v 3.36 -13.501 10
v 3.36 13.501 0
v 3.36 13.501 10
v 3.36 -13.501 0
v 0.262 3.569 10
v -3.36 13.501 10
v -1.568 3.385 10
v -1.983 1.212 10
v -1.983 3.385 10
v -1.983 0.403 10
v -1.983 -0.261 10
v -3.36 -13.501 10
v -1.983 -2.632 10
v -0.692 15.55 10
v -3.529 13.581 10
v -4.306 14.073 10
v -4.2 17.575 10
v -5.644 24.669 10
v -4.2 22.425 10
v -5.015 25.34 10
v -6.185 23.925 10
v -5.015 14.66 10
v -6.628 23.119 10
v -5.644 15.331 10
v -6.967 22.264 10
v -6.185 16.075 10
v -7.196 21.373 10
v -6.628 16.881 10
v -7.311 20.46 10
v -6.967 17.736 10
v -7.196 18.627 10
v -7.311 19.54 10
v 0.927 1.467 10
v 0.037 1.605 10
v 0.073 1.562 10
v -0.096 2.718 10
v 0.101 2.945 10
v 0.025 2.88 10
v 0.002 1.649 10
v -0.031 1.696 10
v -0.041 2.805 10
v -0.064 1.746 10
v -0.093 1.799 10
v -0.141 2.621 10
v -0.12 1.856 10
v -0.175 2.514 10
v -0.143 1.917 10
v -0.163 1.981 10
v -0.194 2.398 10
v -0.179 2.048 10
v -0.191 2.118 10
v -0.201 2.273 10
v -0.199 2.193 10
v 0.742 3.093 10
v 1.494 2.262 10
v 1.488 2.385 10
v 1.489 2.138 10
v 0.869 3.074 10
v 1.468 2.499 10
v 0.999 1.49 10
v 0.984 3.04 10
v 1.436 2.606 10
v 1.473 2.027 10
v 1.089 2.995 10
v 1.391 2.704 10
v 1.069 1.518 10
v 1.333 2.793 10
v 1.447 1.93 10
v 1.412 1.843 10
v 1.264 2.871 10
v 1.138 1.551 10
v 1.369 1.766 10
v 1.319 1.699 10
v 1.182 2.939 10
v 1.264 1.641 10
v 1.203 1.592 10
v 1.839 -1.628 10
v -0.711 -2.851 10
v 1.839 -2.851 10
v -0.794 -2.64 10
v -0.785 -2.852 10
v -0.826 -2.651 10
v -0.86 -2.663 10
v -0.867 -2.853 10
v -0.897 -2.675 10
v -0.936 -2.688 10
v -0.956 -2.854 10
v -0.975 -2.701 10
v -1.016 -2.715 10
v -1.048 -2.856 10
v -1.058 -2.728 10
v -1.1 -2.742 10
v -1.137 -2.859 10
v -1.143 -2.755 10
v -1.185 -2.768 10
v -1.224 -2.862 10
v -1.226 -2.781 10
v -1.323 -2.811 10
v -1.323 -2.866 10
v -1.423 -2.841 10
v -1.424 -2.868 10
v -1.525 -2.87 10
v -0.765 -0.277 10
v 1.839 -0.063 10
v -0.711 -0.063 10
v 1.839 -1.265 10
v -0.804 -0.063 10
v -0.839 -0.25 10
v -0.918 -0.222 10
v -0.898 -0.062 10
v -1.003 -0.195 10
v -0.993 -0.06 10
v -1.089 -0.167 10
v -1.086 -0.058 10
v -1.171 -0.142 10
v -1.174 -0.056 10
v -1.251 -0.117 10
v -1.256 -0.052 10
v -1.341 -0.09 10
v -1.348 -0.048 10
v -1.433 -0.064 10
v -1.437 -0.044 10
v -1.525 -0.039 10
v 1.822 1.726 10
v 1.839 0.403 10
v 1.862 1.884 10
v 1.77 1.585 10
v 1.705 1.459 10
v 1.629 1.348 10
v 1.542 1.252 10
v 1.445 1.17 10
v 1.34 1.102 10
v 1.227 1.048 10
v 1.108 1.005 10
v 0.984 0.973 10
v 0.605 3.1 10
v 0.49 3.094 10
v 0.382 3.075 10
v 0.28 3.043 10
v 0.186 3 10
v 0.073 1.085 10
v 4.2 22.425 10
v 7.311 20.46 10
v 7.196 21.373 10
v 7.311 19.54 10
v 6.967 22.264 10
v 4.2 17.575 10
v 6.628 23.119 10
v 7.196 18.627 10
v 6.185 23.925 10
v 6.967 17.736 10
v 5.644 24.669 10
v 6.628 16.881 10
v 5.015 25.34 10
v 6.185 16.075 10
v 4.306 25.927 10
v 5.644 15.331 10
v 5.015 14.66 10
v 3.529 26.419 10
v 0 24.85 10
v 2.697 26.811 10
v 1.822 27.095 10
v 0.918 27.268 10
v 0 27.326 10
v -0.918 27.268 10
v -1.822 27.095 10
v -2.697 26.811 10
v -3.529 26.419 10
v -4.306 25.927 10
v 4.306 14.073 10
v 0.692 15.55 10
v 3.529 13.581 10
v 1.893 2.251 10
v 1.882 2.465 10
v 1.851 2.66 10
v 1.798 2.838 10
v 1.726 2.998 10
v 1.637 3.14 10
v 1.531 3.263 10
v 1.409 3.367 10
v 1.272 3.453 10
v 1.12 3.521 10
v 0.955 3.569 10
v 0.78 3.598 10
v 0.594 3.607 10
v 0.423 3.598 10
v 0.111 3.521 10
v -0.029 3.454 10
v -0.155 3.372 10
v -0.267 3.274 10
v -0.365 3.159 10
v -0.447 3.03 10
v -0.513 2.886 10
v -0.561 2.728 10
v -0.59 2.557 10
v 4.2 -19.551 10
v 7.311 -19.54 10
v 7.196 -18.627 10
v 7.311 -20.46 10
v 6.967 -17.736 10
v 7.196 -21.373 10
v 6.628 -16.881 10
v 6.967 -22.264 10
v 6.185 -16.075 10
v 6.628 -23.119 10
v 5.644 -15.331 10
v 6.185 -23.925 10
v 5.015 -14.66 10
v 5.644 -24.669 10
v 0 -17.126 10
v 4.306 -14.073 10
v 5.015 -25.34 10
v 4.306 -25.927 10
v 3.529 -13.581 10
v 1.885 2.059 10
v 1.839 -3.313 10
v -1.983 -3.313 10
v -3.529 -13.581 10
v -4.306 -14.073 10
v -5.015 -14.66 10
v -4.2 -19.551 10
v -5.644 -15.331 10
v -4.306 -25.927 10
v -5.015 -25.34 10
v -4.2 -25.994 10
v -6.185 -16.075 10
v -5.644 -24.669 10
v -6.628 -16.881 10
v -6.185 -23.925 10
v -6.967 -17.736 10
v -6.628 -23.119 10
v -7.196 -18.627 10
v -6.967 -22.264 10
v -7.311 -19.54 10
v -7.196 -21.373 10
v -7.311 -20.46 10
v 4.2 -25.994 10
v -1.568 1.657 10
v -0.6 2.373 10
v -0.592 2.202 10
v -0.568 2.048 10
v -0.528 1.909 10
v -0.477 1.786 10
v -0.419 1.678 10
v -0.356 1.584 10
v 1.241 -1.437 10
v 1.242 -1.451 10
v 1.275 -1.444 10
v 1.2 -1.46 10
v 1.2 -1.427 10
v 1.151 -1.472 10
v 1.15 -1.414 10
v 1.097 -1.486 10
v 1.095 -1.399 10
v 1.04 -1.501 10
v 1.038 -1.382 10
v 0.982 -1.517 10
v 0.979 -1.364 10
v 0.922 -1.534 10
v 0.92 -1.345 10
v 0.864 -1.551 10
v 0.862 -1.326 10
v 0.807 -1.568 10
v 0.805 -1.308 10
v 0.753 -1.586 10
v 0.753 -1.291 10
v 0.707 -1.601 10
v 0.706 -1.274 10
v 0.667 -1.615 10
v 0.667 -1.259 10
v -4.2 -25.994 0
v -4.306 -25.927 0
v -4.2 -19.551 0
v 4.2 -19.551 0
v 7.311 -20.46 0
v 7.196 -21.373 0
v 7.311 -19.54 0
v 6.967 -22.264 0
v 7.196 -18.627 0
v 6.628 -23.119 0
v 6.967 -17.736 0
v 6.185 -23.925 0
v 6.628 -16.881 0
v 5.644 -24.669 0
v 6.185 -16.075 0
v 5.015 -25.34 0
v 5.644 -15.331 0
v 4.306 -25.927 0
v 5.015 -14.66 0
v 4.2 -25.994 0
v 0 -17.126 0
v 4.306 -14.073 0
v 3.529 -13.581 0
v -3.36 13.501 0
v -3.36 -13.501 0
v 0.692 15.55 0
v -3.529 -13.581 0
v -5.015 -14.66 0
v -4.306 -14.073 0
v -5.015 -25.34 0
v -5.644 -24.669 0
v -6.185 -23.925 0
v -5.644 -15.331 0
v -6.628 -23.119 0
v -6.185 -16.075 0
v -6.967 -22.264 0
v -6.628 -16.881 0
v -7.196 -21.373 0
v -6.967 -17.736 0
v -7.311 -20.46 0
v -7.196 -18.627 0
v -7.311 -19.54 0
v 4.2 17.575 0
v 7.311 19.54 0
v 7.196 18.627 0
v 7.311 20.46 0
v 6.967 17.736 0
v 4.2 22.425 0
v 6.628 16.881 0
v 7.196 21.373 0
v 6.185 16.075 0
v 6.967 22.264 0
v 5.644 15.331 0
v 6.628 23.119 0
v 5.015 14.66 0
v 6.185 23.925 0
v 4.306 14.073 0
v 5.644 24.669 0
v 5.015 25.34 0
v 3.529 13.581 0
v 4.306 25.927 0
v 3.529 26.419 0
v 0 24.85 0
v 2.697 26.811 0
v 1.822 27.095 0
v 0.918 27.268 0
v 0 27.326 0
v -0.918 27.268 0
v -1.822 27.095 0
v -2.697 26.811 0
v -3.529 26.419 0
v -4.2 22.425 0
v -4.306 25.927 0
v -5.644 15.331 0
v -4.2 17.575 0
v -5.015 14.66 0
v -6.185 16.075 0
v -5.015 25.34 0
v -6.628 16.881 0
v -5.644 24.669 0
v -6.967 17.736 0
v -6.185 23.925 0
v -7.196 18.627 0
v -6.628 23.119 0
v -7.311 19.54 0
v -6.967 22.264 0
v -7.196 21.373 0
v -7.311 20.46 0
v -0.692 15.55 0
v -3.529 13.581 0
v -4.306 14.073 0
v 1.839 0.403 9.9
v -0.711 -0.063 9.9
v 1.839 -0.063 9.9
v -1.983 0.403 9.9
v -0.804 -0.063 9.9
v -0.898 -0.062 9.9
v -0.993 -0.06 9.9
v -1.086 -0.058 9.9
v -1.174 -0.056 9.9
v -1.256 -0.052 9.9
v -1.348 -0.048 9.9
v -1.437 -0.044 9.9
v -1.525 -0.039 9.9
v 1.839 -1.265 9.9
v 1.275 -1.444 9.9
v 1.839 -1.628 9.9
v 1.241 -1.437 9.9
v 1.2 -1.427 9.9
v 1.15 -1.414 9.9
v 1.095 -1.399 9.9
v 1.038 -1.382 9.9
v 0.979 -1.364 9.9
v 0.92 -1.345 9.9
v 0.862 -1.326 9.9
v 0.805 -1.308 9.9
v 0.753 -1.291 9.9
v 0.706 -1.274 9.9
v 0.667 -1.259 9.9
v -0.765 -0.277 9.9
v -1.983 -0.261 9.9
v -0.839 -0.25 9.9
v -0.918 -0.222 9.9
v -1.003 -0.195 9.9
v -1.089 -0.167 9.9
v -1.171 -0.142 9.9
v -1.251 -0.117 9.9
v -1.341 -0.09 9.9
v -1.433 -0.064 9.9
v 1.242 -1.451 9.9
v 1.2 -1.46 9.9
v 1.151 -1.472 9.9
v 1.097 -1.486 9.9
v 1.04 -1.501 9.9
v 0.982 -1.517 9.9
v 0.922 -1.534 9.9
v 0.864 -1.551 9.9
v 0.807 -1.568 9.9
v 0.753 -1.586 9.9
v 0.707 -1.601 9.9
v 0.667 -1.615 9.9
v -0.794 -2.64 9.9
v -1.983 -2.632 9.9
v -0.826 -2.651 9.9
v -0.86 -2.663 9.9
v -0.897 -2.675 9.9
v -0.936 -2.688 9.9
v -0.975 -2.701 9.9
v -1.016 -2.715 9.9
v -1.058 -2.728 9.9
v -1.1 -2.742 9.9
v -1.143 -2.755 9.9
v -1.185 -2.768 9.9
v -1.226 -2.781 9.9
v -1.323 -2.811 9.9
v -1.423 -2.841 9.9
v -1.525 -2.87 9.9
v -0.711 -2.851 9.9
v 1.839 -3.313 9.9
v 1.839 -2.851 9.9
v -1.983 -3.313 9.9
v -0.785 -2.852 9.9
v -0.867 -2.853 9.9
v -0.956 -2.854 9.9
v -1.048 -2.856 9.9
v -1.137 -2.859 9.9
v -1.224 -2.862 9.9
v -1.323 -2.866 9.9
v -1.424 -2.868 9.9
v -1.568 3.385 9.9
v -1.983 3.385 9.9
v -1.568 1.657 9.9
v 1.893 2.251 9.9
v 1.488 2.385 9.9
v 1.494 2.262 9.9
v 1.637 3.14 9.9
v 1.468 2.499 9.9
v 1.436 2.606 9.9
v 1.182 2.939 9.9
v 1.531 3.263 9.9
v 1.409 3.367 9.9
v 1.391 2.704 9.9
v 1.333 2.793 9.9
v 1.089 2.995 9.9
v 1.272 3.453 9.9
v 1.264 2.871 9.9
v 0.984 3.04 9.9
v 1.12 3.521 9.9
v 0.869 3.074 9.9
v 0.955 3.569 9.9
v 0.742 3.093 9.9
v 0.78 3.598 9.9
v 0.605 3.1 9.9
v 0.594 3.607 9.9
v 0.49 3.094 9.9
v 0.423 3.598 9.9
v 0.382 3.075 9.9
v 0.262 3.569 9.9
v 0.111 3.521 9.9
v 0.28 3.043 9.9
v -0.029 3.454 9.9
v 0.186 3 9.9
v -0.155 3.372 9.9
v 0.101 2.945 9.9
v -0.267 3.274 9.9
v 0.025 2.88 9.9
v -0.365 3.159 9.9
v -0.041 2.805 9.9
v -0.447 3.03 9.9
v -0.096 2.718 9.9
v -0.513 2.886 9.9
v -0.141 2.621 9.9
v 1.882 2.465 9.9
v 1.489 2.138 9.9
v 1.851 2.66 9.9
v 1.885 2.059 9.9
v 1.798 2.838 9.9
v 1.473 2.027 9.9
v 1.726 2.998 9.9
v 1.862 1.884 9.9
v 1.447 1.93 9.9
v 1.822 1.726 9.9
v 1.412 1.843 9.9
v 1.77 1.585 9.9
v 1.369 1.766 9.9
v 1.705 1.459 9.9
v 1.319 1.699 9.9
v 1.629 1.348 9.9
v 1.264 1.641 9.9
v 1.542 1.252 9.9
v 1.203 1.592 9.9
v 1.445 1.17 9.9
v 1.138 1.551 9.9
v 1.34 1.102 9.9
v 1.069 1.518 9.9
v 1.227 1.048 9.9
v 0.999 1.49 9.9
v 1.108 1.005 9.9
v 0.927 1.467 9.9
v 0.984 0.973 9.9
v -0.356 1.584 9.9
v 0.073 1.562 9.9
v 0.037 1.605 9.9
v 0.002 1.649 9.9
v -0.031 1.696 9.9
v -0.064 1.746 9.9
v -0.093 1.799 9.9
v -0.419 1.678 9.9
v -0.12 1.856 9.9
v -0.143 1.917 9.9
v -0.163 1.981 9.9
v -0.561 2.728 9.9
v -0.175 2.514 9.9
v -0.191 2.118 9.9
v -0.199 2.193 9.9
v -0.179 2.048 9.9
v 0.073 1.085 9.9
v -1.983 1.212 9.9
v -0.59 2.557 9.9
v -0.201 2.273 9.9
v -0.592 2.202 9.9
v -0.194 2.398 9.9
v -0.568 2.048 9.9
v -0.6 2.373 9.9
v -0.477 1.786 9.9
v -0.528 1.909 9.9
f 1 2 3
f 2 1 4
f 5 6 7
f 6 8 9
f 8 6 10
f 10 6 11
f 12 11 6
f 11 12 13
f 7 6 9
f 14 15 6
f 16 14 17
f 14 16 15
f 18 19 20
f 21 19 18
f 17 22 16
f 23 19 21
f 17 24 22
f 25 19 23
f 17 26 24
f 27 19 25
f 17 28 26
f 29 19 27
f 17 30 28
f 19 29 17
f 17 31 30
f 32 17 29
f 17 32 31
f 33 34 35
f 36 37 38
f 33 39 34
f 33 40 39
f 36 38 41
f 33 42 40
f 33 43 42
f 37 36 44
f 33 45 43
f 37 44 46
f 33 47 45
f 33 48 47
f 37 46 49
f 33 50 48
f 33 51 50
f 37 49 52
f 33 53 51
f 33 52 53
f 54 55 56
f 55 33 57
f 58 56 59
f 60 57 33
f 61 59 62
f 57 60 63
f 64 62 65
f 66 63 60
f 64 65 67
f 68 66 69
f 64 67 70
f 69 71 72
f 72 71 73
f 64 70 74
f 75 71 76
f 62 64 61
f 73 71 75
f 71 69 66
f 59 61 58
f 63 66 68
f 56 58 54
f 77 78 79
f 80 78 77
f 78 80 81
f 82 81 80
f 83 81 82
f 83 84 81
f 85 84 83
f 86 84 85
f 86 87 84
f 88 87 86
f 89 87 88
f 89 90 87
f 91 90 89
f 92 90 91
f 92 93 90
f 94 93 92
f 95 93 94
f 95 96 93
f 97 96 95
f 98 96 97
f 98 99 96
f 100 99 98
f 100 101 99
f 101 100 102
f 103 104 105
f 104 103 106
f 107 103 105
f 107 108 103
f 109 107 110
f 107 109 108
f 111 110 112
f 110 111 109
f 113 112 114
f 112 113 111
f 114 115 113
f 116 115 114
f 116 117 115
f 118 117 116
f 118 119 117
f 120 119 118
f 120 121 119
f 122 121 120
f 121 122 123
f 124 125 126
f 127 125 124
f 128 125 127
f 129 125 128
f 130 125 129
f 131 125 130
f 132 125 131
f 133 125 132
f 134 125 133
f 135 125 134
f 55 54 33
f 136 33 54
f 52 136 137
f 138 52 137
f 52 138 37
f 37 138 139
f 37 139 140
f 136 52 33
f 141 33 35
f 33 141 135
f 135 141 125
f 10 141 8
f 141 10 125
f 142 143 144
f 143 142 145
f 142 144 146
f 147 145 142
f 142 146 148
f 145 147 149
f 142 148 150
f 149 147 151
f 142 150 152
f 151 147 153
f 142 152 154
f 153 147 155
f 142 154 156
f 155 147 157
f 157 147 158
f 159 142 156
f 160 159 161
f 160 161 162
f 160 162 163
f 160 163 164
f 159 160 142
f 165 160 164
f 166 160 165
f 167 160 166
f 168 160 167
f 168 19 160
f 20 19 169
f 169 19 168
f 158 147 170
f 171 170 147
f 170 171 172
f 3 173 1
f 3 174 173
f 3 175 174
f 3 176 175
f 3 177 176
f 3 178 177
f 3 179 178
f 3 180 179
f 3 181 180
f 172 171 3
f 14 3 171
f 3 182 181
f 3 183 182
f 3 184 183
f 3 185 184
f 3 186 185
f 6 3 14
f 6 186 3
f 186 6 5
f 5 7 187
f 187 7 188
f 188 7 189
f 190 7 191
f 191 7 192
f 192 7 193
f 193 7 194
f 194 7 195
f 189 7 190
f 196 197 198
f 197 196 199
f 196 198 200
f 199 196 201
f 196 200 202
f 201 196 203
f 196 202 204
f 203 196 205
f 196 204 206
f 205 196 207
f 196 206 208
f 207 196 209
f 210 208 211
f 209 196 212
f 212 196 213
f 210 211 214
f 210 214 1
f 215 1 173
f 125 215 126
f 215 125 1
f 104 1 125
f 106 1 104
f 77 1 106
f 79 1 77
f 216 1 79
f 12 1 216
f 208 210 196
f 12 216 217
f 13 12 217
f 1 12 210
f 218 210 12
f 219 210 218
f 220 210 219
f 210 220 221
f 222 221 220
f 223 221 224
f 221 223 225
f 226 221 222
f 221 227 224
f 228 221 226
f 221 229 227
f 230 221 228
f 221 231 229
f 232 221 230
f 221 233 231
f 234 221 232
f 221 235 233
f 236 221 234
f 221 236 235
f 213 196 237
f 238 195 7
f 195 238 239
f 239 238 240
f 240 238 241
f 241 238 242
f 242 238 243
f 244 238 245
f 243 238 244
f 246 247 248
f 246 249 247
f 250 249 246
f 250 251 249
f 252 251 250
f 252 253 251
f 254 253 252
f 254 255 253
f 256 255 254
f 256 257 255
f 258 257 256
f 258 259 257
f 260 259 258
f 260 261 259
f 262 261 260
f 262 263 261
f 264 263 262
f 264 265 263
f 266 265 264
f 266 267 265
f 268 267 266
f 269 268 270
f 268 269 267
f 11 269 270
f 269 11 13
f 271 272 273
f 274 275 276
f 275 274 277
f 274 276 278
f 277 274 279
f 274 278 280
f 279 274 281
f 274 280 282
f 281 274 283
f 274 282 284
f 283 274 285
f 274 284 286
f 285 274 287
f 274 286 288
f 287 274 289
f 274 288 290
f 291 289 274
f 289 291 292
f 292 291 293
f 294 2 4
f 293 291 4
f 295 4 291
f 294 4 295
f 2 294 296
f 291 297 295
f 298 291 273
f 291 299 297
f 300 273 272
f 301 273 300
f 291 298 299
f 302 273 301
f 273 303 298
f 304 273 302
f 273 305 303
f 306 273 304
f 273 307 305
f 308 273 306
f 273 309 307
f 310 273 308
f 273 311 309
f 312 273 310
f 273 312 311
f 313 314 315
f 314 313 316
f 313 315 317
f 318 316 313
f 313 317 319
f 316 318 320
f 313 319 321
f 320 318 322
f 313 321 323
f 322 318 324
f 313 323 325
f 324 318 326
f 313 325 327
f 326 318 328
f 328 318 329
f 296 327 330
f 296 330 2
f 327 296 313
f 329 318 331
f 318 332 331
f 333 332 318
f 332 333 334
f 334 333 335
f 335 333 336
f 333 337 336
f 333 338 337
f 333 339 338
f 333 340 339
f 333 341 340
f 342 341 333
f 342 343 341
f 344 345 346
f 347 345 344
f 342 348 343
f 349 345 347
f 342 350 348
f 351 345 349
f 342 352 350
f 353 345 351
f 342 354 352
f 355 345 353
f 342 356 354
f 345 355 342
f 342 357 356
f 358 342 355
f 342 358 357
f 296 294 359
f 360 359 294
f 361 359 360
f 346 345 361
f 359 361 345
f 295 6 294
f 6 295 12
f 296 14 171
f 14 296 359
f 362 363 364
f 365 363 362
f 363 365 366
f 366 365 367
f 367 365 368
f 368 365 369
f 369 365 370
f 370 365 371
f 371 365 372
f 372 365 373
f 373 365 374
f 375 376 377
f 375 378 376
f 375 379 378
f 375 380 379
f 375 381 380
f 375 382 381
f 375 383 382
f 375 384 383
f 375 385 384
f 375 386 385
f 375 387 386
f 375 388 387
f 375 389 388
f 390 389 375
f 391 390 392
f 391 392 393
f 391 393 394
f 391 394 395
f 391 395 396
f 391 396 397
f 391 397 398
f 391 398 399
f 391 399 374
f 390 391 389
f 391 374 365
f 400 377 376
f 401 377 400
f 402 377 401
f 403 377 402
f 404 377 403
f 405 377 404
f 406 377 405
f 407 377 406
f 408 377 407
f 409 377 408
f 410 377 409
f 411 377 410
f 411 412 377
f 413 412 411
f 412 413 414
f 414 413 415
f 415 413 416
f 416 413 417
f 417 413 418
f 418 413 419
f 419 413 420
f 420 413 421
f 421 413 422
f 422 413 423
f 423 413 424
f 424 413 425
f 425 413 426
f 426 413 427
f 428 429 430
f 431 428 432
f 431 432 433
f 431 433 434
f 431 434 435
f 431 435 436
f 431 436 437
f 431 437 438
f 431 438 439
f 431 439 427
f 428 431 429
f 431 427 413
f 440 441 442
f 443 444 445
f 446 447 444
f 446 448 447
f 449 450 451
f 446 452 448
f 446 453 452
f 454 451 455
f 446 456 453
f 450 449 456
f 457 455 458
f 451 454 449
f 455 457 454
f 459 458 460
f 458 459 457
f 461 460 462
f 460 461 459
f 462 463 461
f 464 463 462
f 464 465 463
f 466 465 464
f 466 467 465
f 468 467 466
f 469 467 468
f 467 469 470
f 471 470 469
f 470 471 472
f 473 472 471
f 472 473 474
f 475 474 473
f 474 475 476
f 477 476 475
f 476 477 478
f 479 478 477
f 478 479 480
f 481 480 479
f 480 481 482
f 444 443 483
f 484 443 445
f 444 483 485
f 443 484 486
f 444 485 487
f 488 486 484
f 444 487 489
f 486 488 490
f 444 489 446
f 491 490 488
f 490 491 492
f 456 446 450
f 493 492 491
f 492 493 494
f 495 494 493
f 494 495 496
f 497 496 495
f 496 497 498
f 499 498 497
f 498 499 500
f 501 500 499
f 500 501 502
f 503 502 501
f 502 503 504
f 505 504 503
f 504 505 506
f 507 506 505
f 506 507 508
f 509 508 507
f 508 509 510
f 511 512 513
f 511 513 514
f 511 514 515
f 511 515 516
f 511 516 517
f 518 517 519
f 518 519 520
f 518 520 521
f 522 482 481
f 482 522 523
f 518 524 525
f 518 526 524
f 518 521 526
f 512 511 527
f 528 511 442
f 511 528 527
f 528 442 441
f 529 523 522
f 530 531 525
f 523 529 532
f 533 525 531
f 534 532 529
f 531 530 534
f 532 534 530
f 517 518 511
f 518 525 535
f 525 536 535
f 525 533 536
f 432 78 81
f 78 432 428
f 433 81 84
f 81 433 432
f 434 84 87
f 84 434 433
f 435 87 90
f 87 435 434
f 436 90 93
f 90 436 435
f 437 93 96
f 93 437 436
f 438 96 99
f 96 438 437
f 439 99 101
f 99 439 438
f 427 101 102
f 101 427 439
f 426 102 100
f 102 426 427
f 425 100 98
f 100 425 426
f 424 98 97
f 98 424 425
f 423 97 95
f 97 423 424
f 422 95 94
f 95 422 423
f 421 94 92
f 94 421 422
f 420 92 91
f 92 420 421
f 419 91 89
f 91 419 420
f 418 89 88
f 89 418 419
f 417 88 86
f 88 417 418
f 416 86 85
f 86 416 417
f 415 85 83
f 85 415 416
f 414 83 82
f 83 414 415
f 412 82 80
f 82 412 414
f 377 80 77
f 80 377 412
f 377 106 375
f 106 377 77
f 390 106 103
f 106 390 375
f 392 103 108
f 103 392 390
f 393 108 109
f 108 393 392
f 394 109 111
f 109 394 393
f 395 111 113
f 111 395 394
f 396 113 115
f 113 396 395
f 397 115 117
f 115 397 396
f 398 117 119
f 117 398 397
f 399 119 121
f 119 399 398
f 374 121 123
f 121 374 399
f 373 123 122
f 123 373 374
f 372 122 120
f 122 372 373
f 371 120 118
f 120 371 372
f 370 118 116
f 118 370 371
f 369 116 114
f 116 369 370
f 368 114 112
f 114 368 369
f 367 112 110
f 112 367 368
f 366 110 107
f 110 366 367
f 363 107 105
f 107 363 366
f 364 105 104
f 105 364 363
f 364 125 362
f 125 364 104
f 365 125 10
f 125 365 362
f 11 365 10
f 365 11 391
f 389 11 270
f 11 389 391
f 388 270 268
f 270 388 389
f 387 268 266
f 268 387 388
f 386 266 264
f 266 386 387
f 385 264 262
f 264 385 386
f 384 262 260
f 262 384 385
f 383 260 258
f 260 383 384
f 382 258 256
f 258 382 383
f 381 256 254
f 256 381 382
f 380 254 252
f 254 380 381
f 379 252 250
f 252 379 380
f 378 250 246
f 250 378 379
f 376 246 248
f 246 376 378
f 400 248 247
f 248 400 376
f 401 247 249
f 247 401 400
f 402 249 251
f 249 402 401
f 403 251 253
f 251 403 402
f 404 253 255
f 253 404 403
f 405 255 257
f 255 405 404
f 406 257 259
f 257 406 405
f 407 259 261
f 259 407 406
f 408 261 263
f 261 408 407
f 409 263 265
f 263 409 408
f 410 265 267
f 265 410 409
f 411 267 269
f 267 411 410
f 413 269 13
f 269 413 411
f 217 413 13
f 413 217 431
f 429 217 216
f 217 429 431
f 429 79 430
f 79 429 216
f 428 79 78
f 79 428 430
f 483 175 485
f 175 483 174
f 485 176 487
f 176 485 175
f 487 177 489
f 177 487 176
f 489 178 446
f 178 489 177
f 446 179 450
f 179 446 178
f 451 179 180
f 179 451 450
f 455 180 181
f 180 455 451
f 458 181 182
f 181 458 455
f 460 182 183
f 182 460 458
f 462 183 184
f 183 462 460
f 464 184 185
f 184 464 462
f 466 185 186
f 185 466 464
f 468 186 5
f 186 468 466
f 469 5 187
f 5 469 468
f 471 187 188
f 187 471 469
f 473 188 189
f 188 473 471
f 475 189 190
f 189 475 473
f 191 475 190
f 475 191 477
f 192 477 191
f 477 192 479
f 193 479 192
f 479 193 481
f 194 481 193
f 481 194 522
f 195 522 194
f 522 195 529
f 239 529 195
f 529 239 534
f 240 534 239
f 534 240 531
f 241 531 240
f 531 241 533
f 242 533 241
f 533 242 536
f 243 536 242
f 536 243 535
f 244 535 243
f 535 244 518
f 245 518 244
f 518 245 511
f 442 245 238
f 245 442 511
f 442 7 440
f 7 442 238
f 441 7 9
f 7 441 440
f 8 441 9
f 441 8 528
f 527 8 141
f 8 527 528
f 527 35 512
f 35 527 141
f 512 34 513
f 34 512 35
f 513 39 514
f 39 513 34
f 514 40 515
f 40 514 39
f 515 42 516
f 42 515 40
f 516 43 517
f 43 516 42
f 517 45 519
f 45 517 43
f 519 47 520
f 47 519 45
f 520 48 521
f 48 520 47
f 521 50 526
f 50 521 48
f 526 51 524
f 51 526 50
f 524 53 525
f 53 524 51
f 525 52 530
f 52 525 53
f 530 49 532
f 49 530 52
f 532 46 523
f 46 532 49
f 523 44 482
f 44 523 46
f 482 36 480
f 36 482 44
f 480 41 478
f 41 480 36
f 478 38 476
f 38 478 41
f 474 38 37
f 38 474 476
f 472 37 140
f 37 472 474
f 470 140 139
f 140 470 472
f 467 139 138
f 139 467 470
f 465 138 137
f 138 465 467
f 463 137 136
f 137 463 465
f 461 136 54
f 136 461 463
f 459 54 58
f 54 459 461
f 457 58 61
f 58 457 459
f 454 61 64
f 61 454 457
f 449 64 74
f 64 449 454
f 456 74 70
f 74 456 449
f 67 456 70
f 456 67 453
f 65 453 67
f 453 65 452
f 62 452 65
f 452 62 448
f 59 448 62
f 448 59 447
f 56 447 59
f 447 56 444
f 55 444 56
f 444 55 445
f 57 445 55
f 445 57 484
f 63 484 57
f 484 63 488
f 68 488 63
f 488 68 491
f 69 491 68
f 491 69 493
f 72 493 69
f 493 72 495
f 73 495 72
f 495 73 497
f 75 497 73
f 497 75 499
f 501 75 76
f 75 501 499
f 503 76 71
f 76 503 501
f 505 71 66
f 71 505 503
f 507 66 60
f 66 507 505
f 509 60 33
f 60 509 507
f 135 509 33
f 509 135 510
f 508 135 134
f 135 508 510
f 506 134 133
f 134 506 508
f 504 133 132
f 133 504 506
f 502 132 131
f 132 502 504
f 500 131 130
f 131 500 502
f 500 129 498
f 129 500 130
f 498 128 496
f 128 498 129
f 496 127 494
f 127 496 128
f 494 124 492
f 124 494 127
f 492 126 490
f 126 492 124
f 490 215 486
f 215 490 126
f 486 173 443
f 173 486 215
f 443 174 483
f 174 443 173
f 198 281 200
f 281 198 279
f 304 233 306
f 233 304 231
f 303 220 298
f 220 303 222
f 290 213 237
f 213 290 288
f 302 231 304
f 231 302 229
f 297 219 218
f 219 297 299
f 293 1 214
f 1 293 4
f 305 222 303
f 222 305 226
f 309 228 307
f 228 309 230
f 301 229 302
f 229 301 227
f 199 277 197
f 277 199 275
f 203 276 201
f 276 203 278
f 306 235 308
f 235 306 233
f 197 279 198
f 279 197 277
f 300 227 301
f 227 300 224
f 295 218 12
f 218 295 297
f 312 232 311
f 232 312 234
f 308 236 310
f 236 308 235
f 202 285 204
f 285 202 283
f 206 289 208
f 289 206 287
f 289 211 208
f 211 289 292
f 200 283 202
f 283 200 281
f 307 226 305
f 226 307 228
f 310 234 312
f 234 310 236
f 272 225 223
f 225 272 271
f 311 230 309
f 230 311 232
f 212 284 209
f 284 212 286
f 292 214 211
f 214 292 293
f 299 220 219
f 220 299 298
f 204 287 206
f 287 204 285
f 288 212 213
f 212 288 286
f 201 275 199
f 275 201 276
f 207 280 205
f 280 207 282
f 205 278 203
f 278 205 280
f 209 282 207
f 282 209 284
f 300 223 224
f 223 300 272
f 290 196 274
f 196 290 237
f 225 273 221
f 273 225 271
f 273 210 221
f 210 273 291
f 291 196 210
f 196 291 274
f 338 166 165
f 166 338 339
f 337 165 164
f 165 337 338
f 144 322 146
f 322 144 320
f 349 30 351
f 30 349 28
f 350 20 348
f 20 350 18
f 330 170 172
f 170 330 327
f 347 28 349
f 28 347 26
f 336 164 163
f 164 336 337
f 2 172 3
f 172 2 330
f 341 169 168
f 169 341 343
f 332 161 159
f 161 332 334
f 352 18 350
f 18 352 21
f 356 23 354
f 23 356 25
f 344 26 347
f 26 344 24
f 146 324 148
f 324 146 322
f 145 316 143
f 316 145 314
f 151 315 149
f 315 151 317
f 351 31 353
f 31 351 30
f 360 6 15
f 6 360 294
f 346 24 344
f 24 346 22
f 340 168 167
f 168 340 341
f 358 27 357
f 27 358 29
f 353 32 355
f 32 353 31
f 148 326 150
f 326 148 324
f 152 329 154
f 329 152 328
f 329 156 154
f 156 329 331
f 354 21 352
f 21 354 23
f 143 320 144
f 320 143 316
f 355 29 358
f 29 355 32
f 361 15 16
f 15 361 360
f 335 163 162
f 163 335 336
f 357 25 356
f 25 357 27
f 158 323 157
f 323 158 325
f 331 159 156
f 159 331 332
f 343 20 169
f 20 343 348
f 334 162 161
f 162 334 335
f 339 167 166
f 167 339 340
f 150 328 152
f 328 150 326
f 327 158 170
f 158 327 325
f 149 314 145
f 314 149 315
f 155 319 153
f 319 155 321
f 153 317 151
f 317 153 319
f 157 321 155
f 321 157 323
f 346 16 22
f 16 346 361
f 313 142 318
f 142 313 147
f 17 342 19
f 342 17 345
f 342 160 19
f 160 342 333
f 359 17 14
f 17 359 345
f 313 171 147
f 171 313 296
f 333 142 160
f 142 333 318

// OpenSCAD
                        //******************************************
                        //* Base configuration
                        //******************************************
                        
                        //Set the nut properties
                        NUT_DIMENSION_METRIC = /*M*/5; // this is the number after M (eg. M4 -> 4)
                        // >>> NOTE <<<
                        // the metric parameter works ONLY for nuts from M1.6 up to M20
                        // If your nut has different size, please set it here:
                        // (leave -1 if you use metric)
                        NUT_DIMENSION = -1/*mm*/;
                        
                        WRENCH_THICKNESS_MM         = 10;    // this is the thickness of the wrench   
                        WRENCH_LENGHT_MM            = 40;   // this is the lenght of the wrench
                        CORRECT_LENGTH_IF_TOO_SHORT = true; // correct wrench lenght if is too short according with nut size
                        
                        // Choose if you want both closed and open heads, or only one of them
                        ADD_OPEN_HEAD = true;
                        ADD_CLOSED_HEAD = true;
                        
                        //-------------------------------------------------------
                        // PRINT HINTS
                        // Higher the infill rate is, stronger the wrench will be
                        // I suggest, at least, a 30% honeycomb fill
                        //-------------------------------------------------------
                        
                        
                        
                        //******************************************
                        //* Advanced configuration
                        //******************************************
                        // Change thickness of the border around nut hole
                        // A thicker border make wrench stronger, but wider
                        //  - Positive value: additional thickness around nut hole
                        //  - Negative value: less thickness around nut hole
                        fHeadBoardersAdditionalThickness = 0;
                        
                        // According to your printer precision, you can change 
                        // the 'nut holes offset' value. This affect the size of nut hole.
                        // Positive value: bigger hole
                        // Negative value: smaller hole
                        fNutHoleOffet = 0.2;
                        
                        
                        
                        
                        
                        
                        
                        
                        
                        //********************************************************************************
                        //* Do not modify below this line
                        //********************************************************************************
                        
                        // Variables cannot be assigned with if statement, so do this trick
                        iNutDiameter = (NUT_DIMENSION > 0) ? (NUT_DIMENSION) : (
                            (NUT_DIMENSION_METRIC == 1.6) ? 3.2 : (
                                (NUT_DIMENSION_METRIC == 2) ? 4 : (
                                    (NUT_DIMENSION_METRIC == 2.5) ? 5 : (
                                        (NUT_DIMENSION_METRIC == 3) ? 5.5 : (
                                            (NUT_DIMENSION_METRIC == 4) ? 7 : (
                                                (NUT_DIMENSION_METRIC == 5) ? 8 : (
                                                    (NUT_DIMENSION_METRIC == 6) ? 10 : (
                                                        (NUT_DIMENSION_METRIC == 8) ? 13 : (
                                                            (NUT_DIMENSION_METRIC == 10) ? 16 : (
                                                                (NUT_DIMENSION_METRIC == 12) ? 18 : (
                                                                    (NUT_DIMENSION_METRIC == 14) ? 21 : (
                                                                        (NUT_DIMENSION_METRIC == 16) ? 24 : (
                                                                            (NUT_DIMENSION_METRIC == 20) ? 30 : (
                                                                                // For nut > M20 or not standard return 0
                                                                                0
                                                                            )
                                                                        )
                                                                    )
                                                                )
                                                            )
                                                        )
                                                    )
                                                )
                                            )
                                        )
                                    )
                                )
                            )
                        );
                        
                        iNutThickness = WRENCH_THICKNESS_MM;
                        
                        // Calculate the radius of cylinder which model the nut 
                        // (it will be a 6-faces cylinder, so an hexagon)
                        iNutCylinderRadius = iNutDiameter/2 + fNutHoleOffet;
                        
                        // Calculate the radius of the circular part around the
                        // nut hole.
                        
                        
                        // Calculate the header space around nut hole using
                        // linear function
                        iHeadSpaceForM2 = min(2, fHeadBoardersAdditionalThickness);
                        iHeadSpaceForM10 = 7 + fHeadBoardersAdditionalThickness;  // 13mm of diameter
                        
                        iM2Diameter = 4;
                        iM10Diameter = 13;
                        // two points are:
                        // A = (iM2Diameter, iHeadSpaceForM2) 
                        // B = (iM10Diameter, iHeadSpaceForM10)
                        //              yB - yA
                        //    y - yA = -------- (x - xA)
                        //              xB - xA
                        iHeaderRadiusOffset = ((iHeadSpaceForM10-iHeadSpaceForM2) / (iM10Diameter-iM2Diameter)) * (iNutDiameter - iM2Diameter) + iHeadSpaceForM2;
                        
                        //iHeaderRadiusOffset = 0.225*iNutDiameter + 0.75;
                        
                        echo("Nut diameter is:", iNutDiameter);
                        echo("Offset is:", iHeaderRadiusOffset);
                        iHeadRadius = iNutCylinderRadius + iHeaderRadiusOffset;
                        
                        /*
                         * See this page:
                         * https://en.wikibooks.org/wiki/OpenSCAD_User_Manual/undersized_circular_objects
                         */
                        module cylinder_outer(height,radius,fn)
                        {
                           fudge = 1/cos(180/fn);
                           cylinder(h=height,r=radius*fudge,$fn=fn);
                        }
                        
                        module createNutProfile()
                        {
                            // Add a little bit of offset on the height and traslate down
                            // of the same amount, to avoid wrong booleand operation with
                            // the rounded section
                            iNutHeightOffset = 0.5;
                            translate([0,0,-iNutHeightOffset/2]){
                                rotate(a=[0,0,90]){
                                    // The nut profile is obtained from a cylinder with 6 faces
                                    cylinder_outer(iNutThickness+iNutHeightOffset, iNutCylinderRadius, 6);
                                }
                            }
                        }
                        
                        module createNutAdditionalSquaredHole(iPosY)
                        {
                            iSize = iNutCylinderRadius*2;
                            iHeightOffset = 0.2;
                            iHeight = WRENCH_THICKNESS_MM + iHeightOffset;
                            translate([0,iPosY,iHeight/2 - iHeightOffset/2]){
                                cube(size = [iSize, iSize, iHeight], center = true);
                            };
                        }
                        
                        module createCylindricalHead()
                        {
                            rotate(a=[0,0,90]){
                                cylinder_outer(iNutThickness, iHeadRadius, 50);
                            }
                        }
                        
                        module createOpenHead(iPosY=0)
                        {
                            translate([0,iPosY,0]){
                                /*
                                 * The nut hexagon is created via 'cylinder outer' so
                                 * the cylinder diameter is the length of face-to-face segment
                                 * and NOT the angle-to-angle segment.
                                 * So we need to calculate it
                                 * According to https://en.wikipedia.org/wiki/Hexagon we calculate
                                 * the value of 'R'based on 'r'
                                 */    
                                iNutAngleToAngleLenght = iNutCylinderRadius/ cos(30);    
                                // Do the same for the cylinder around the nut hole
                                iHeadAngleToAngleLenght = iHeadRadius/ cos(30);
                                
                                iAdjustNutPos = iNutAngleToAngleLenght/3;
                                
                                iDelta = (iHeadAngleToAngleLenght - iNutAngleToAngleLenght) - iAdjustNutPos - fHeadBoardersAdditionalThickness;
                               
                                difference(){
                                    createCylindricalHead();
                                    translate([0, -(iDelta), 0 / 2]) {
                                        createNutProfile();
                                    };
                                    createNutAdditionalSquaredHole(-(iDelta+iNutAngleToAngleLenght));
                                }
                                
                            }
                            
                        }
                        
                        module createClosedHead(iPosY=0)
                        {
                            translate([0,iPosY,0]){
                                difference(){
                                    createCylindricalHead();
                                    createNutProfile();
                                }
                            }
                        }
                        
                        module createRoundedHandleEdge(iPosY, iHandleWidth)
                        {
                            iRadius = iHandleWidth/2;
                            translate([0,iPosY,0]){
                                cylinder(h=WRENCH_THICKNESS_MM,r=iRadius,$fn=20);
                            }
                        }
                        
                        module create3DText(sText, iSize, iThickness)
                        {
                            font = "Arial";
                            //letter_size = 50;
                            //letter_height = 1;
                            // Use linear_extrude() to make the letters 3D objects as they
                            // are only 2D shapes when only using text()
                            
                            linear_extrude(height = iThickness) {
                                text(sText, size = iSize, font = font, halign = "center", valign = "center", $fn = 16);
                            }
                        }
                        
                        module addTextToHandle(sText, iPosY, iTextSize)
                        {
                            iTextThickness = 0.4;
                            
                            iTextSize = min(iTextSize, 5);
                            
                            iTextYOffsetToBooleanSubtraction = 0.1;
                            translate([0, iPosY, WRENCH_THICKNESS_MM - iTextYOffsetToBooleanSubtraction]){
                                rotate([0,0,90]){
                                    create3DText(sText, iTextSize - 1, iTextThickness + iTextYOffsetToBooleanSubtraction);
                                };
                            };
                        }
                        
                        iMinDist = 10;
                        function calculateCorrectedLenght() = ((WRENCH_LENGHT_MM - (iNutDiameter*2) > iMinDist) ? WRENCH_LENGHT_MM : (iNutDiameter*2 + iMinDist));
                        
                        function getWrenchLenght() = ( (CORRECT_LENGTH_IF_TOO_SHORT == true) ? calculateCorrectedLenght() : WRENCH_LENGHT_MM );
                        
                        module createHandle()
                        {
                            // Calculate if the length user set
                            iUserLenght = getWrenchLenght();
                            
                            iLength = iUserLenght - (iNutCylinderRadius*2 + 0.5);
                            iWidth = iNutCylinderRadius*1.6;
                            
                            sText = (NUT_DIMENSION > 0) ? (str(NUT_DIMENSION, "mm")) : (str("M", NUT_DIMENSION_METRIC));
                            
                            union(){
                                
                                difference(){
                                    // Create the handle with a parallelepiped
                                    translate([0,0,(WRENCH_THICKNESS_MM/2)]){
                                        cube(
                                            size = [
                                                iWidth,
                                                iLength,
                                                WRENCH_THICKNESS_MM
                                            ], 
                                            center = true
                                        );
                                    };
                                    // Subtract the text
                                    //addTextToHandle(sText, (iLength/2) - 5, iWidth);
                                    addTextToHandle(sText, 0, iWidth);
                                } // close difference()
                                
                                // Put a rounded edge if not both head exist
                                if( ADD_OPEN_HEAD == false){
                                    createRoundedHandleEdge(-(iLength/2), iWidth);
                                }
                                if(ADD_CLOSED_HEAD == false){
                                    createRoundedHandleEdge(iLength/2, iWidth);
                                }
                            } // close union()
                            
                        }
                        
                        
                        
                        
                        
                        
                        
                        // Create the handle section
                        createHandle();
                        // then closed and open section
                        iDistanceFromOrigin = getWrenchLenght()/2;
                        if( ADD_OPEN_HEAD == true){
                            createOpenHead(-iDistanceFromOrigin);
                        }
                        if( ADD_CLOSED_HEAD == true){
                            createClosedHead(iDistanceFromOrigin);
                        }
                    
